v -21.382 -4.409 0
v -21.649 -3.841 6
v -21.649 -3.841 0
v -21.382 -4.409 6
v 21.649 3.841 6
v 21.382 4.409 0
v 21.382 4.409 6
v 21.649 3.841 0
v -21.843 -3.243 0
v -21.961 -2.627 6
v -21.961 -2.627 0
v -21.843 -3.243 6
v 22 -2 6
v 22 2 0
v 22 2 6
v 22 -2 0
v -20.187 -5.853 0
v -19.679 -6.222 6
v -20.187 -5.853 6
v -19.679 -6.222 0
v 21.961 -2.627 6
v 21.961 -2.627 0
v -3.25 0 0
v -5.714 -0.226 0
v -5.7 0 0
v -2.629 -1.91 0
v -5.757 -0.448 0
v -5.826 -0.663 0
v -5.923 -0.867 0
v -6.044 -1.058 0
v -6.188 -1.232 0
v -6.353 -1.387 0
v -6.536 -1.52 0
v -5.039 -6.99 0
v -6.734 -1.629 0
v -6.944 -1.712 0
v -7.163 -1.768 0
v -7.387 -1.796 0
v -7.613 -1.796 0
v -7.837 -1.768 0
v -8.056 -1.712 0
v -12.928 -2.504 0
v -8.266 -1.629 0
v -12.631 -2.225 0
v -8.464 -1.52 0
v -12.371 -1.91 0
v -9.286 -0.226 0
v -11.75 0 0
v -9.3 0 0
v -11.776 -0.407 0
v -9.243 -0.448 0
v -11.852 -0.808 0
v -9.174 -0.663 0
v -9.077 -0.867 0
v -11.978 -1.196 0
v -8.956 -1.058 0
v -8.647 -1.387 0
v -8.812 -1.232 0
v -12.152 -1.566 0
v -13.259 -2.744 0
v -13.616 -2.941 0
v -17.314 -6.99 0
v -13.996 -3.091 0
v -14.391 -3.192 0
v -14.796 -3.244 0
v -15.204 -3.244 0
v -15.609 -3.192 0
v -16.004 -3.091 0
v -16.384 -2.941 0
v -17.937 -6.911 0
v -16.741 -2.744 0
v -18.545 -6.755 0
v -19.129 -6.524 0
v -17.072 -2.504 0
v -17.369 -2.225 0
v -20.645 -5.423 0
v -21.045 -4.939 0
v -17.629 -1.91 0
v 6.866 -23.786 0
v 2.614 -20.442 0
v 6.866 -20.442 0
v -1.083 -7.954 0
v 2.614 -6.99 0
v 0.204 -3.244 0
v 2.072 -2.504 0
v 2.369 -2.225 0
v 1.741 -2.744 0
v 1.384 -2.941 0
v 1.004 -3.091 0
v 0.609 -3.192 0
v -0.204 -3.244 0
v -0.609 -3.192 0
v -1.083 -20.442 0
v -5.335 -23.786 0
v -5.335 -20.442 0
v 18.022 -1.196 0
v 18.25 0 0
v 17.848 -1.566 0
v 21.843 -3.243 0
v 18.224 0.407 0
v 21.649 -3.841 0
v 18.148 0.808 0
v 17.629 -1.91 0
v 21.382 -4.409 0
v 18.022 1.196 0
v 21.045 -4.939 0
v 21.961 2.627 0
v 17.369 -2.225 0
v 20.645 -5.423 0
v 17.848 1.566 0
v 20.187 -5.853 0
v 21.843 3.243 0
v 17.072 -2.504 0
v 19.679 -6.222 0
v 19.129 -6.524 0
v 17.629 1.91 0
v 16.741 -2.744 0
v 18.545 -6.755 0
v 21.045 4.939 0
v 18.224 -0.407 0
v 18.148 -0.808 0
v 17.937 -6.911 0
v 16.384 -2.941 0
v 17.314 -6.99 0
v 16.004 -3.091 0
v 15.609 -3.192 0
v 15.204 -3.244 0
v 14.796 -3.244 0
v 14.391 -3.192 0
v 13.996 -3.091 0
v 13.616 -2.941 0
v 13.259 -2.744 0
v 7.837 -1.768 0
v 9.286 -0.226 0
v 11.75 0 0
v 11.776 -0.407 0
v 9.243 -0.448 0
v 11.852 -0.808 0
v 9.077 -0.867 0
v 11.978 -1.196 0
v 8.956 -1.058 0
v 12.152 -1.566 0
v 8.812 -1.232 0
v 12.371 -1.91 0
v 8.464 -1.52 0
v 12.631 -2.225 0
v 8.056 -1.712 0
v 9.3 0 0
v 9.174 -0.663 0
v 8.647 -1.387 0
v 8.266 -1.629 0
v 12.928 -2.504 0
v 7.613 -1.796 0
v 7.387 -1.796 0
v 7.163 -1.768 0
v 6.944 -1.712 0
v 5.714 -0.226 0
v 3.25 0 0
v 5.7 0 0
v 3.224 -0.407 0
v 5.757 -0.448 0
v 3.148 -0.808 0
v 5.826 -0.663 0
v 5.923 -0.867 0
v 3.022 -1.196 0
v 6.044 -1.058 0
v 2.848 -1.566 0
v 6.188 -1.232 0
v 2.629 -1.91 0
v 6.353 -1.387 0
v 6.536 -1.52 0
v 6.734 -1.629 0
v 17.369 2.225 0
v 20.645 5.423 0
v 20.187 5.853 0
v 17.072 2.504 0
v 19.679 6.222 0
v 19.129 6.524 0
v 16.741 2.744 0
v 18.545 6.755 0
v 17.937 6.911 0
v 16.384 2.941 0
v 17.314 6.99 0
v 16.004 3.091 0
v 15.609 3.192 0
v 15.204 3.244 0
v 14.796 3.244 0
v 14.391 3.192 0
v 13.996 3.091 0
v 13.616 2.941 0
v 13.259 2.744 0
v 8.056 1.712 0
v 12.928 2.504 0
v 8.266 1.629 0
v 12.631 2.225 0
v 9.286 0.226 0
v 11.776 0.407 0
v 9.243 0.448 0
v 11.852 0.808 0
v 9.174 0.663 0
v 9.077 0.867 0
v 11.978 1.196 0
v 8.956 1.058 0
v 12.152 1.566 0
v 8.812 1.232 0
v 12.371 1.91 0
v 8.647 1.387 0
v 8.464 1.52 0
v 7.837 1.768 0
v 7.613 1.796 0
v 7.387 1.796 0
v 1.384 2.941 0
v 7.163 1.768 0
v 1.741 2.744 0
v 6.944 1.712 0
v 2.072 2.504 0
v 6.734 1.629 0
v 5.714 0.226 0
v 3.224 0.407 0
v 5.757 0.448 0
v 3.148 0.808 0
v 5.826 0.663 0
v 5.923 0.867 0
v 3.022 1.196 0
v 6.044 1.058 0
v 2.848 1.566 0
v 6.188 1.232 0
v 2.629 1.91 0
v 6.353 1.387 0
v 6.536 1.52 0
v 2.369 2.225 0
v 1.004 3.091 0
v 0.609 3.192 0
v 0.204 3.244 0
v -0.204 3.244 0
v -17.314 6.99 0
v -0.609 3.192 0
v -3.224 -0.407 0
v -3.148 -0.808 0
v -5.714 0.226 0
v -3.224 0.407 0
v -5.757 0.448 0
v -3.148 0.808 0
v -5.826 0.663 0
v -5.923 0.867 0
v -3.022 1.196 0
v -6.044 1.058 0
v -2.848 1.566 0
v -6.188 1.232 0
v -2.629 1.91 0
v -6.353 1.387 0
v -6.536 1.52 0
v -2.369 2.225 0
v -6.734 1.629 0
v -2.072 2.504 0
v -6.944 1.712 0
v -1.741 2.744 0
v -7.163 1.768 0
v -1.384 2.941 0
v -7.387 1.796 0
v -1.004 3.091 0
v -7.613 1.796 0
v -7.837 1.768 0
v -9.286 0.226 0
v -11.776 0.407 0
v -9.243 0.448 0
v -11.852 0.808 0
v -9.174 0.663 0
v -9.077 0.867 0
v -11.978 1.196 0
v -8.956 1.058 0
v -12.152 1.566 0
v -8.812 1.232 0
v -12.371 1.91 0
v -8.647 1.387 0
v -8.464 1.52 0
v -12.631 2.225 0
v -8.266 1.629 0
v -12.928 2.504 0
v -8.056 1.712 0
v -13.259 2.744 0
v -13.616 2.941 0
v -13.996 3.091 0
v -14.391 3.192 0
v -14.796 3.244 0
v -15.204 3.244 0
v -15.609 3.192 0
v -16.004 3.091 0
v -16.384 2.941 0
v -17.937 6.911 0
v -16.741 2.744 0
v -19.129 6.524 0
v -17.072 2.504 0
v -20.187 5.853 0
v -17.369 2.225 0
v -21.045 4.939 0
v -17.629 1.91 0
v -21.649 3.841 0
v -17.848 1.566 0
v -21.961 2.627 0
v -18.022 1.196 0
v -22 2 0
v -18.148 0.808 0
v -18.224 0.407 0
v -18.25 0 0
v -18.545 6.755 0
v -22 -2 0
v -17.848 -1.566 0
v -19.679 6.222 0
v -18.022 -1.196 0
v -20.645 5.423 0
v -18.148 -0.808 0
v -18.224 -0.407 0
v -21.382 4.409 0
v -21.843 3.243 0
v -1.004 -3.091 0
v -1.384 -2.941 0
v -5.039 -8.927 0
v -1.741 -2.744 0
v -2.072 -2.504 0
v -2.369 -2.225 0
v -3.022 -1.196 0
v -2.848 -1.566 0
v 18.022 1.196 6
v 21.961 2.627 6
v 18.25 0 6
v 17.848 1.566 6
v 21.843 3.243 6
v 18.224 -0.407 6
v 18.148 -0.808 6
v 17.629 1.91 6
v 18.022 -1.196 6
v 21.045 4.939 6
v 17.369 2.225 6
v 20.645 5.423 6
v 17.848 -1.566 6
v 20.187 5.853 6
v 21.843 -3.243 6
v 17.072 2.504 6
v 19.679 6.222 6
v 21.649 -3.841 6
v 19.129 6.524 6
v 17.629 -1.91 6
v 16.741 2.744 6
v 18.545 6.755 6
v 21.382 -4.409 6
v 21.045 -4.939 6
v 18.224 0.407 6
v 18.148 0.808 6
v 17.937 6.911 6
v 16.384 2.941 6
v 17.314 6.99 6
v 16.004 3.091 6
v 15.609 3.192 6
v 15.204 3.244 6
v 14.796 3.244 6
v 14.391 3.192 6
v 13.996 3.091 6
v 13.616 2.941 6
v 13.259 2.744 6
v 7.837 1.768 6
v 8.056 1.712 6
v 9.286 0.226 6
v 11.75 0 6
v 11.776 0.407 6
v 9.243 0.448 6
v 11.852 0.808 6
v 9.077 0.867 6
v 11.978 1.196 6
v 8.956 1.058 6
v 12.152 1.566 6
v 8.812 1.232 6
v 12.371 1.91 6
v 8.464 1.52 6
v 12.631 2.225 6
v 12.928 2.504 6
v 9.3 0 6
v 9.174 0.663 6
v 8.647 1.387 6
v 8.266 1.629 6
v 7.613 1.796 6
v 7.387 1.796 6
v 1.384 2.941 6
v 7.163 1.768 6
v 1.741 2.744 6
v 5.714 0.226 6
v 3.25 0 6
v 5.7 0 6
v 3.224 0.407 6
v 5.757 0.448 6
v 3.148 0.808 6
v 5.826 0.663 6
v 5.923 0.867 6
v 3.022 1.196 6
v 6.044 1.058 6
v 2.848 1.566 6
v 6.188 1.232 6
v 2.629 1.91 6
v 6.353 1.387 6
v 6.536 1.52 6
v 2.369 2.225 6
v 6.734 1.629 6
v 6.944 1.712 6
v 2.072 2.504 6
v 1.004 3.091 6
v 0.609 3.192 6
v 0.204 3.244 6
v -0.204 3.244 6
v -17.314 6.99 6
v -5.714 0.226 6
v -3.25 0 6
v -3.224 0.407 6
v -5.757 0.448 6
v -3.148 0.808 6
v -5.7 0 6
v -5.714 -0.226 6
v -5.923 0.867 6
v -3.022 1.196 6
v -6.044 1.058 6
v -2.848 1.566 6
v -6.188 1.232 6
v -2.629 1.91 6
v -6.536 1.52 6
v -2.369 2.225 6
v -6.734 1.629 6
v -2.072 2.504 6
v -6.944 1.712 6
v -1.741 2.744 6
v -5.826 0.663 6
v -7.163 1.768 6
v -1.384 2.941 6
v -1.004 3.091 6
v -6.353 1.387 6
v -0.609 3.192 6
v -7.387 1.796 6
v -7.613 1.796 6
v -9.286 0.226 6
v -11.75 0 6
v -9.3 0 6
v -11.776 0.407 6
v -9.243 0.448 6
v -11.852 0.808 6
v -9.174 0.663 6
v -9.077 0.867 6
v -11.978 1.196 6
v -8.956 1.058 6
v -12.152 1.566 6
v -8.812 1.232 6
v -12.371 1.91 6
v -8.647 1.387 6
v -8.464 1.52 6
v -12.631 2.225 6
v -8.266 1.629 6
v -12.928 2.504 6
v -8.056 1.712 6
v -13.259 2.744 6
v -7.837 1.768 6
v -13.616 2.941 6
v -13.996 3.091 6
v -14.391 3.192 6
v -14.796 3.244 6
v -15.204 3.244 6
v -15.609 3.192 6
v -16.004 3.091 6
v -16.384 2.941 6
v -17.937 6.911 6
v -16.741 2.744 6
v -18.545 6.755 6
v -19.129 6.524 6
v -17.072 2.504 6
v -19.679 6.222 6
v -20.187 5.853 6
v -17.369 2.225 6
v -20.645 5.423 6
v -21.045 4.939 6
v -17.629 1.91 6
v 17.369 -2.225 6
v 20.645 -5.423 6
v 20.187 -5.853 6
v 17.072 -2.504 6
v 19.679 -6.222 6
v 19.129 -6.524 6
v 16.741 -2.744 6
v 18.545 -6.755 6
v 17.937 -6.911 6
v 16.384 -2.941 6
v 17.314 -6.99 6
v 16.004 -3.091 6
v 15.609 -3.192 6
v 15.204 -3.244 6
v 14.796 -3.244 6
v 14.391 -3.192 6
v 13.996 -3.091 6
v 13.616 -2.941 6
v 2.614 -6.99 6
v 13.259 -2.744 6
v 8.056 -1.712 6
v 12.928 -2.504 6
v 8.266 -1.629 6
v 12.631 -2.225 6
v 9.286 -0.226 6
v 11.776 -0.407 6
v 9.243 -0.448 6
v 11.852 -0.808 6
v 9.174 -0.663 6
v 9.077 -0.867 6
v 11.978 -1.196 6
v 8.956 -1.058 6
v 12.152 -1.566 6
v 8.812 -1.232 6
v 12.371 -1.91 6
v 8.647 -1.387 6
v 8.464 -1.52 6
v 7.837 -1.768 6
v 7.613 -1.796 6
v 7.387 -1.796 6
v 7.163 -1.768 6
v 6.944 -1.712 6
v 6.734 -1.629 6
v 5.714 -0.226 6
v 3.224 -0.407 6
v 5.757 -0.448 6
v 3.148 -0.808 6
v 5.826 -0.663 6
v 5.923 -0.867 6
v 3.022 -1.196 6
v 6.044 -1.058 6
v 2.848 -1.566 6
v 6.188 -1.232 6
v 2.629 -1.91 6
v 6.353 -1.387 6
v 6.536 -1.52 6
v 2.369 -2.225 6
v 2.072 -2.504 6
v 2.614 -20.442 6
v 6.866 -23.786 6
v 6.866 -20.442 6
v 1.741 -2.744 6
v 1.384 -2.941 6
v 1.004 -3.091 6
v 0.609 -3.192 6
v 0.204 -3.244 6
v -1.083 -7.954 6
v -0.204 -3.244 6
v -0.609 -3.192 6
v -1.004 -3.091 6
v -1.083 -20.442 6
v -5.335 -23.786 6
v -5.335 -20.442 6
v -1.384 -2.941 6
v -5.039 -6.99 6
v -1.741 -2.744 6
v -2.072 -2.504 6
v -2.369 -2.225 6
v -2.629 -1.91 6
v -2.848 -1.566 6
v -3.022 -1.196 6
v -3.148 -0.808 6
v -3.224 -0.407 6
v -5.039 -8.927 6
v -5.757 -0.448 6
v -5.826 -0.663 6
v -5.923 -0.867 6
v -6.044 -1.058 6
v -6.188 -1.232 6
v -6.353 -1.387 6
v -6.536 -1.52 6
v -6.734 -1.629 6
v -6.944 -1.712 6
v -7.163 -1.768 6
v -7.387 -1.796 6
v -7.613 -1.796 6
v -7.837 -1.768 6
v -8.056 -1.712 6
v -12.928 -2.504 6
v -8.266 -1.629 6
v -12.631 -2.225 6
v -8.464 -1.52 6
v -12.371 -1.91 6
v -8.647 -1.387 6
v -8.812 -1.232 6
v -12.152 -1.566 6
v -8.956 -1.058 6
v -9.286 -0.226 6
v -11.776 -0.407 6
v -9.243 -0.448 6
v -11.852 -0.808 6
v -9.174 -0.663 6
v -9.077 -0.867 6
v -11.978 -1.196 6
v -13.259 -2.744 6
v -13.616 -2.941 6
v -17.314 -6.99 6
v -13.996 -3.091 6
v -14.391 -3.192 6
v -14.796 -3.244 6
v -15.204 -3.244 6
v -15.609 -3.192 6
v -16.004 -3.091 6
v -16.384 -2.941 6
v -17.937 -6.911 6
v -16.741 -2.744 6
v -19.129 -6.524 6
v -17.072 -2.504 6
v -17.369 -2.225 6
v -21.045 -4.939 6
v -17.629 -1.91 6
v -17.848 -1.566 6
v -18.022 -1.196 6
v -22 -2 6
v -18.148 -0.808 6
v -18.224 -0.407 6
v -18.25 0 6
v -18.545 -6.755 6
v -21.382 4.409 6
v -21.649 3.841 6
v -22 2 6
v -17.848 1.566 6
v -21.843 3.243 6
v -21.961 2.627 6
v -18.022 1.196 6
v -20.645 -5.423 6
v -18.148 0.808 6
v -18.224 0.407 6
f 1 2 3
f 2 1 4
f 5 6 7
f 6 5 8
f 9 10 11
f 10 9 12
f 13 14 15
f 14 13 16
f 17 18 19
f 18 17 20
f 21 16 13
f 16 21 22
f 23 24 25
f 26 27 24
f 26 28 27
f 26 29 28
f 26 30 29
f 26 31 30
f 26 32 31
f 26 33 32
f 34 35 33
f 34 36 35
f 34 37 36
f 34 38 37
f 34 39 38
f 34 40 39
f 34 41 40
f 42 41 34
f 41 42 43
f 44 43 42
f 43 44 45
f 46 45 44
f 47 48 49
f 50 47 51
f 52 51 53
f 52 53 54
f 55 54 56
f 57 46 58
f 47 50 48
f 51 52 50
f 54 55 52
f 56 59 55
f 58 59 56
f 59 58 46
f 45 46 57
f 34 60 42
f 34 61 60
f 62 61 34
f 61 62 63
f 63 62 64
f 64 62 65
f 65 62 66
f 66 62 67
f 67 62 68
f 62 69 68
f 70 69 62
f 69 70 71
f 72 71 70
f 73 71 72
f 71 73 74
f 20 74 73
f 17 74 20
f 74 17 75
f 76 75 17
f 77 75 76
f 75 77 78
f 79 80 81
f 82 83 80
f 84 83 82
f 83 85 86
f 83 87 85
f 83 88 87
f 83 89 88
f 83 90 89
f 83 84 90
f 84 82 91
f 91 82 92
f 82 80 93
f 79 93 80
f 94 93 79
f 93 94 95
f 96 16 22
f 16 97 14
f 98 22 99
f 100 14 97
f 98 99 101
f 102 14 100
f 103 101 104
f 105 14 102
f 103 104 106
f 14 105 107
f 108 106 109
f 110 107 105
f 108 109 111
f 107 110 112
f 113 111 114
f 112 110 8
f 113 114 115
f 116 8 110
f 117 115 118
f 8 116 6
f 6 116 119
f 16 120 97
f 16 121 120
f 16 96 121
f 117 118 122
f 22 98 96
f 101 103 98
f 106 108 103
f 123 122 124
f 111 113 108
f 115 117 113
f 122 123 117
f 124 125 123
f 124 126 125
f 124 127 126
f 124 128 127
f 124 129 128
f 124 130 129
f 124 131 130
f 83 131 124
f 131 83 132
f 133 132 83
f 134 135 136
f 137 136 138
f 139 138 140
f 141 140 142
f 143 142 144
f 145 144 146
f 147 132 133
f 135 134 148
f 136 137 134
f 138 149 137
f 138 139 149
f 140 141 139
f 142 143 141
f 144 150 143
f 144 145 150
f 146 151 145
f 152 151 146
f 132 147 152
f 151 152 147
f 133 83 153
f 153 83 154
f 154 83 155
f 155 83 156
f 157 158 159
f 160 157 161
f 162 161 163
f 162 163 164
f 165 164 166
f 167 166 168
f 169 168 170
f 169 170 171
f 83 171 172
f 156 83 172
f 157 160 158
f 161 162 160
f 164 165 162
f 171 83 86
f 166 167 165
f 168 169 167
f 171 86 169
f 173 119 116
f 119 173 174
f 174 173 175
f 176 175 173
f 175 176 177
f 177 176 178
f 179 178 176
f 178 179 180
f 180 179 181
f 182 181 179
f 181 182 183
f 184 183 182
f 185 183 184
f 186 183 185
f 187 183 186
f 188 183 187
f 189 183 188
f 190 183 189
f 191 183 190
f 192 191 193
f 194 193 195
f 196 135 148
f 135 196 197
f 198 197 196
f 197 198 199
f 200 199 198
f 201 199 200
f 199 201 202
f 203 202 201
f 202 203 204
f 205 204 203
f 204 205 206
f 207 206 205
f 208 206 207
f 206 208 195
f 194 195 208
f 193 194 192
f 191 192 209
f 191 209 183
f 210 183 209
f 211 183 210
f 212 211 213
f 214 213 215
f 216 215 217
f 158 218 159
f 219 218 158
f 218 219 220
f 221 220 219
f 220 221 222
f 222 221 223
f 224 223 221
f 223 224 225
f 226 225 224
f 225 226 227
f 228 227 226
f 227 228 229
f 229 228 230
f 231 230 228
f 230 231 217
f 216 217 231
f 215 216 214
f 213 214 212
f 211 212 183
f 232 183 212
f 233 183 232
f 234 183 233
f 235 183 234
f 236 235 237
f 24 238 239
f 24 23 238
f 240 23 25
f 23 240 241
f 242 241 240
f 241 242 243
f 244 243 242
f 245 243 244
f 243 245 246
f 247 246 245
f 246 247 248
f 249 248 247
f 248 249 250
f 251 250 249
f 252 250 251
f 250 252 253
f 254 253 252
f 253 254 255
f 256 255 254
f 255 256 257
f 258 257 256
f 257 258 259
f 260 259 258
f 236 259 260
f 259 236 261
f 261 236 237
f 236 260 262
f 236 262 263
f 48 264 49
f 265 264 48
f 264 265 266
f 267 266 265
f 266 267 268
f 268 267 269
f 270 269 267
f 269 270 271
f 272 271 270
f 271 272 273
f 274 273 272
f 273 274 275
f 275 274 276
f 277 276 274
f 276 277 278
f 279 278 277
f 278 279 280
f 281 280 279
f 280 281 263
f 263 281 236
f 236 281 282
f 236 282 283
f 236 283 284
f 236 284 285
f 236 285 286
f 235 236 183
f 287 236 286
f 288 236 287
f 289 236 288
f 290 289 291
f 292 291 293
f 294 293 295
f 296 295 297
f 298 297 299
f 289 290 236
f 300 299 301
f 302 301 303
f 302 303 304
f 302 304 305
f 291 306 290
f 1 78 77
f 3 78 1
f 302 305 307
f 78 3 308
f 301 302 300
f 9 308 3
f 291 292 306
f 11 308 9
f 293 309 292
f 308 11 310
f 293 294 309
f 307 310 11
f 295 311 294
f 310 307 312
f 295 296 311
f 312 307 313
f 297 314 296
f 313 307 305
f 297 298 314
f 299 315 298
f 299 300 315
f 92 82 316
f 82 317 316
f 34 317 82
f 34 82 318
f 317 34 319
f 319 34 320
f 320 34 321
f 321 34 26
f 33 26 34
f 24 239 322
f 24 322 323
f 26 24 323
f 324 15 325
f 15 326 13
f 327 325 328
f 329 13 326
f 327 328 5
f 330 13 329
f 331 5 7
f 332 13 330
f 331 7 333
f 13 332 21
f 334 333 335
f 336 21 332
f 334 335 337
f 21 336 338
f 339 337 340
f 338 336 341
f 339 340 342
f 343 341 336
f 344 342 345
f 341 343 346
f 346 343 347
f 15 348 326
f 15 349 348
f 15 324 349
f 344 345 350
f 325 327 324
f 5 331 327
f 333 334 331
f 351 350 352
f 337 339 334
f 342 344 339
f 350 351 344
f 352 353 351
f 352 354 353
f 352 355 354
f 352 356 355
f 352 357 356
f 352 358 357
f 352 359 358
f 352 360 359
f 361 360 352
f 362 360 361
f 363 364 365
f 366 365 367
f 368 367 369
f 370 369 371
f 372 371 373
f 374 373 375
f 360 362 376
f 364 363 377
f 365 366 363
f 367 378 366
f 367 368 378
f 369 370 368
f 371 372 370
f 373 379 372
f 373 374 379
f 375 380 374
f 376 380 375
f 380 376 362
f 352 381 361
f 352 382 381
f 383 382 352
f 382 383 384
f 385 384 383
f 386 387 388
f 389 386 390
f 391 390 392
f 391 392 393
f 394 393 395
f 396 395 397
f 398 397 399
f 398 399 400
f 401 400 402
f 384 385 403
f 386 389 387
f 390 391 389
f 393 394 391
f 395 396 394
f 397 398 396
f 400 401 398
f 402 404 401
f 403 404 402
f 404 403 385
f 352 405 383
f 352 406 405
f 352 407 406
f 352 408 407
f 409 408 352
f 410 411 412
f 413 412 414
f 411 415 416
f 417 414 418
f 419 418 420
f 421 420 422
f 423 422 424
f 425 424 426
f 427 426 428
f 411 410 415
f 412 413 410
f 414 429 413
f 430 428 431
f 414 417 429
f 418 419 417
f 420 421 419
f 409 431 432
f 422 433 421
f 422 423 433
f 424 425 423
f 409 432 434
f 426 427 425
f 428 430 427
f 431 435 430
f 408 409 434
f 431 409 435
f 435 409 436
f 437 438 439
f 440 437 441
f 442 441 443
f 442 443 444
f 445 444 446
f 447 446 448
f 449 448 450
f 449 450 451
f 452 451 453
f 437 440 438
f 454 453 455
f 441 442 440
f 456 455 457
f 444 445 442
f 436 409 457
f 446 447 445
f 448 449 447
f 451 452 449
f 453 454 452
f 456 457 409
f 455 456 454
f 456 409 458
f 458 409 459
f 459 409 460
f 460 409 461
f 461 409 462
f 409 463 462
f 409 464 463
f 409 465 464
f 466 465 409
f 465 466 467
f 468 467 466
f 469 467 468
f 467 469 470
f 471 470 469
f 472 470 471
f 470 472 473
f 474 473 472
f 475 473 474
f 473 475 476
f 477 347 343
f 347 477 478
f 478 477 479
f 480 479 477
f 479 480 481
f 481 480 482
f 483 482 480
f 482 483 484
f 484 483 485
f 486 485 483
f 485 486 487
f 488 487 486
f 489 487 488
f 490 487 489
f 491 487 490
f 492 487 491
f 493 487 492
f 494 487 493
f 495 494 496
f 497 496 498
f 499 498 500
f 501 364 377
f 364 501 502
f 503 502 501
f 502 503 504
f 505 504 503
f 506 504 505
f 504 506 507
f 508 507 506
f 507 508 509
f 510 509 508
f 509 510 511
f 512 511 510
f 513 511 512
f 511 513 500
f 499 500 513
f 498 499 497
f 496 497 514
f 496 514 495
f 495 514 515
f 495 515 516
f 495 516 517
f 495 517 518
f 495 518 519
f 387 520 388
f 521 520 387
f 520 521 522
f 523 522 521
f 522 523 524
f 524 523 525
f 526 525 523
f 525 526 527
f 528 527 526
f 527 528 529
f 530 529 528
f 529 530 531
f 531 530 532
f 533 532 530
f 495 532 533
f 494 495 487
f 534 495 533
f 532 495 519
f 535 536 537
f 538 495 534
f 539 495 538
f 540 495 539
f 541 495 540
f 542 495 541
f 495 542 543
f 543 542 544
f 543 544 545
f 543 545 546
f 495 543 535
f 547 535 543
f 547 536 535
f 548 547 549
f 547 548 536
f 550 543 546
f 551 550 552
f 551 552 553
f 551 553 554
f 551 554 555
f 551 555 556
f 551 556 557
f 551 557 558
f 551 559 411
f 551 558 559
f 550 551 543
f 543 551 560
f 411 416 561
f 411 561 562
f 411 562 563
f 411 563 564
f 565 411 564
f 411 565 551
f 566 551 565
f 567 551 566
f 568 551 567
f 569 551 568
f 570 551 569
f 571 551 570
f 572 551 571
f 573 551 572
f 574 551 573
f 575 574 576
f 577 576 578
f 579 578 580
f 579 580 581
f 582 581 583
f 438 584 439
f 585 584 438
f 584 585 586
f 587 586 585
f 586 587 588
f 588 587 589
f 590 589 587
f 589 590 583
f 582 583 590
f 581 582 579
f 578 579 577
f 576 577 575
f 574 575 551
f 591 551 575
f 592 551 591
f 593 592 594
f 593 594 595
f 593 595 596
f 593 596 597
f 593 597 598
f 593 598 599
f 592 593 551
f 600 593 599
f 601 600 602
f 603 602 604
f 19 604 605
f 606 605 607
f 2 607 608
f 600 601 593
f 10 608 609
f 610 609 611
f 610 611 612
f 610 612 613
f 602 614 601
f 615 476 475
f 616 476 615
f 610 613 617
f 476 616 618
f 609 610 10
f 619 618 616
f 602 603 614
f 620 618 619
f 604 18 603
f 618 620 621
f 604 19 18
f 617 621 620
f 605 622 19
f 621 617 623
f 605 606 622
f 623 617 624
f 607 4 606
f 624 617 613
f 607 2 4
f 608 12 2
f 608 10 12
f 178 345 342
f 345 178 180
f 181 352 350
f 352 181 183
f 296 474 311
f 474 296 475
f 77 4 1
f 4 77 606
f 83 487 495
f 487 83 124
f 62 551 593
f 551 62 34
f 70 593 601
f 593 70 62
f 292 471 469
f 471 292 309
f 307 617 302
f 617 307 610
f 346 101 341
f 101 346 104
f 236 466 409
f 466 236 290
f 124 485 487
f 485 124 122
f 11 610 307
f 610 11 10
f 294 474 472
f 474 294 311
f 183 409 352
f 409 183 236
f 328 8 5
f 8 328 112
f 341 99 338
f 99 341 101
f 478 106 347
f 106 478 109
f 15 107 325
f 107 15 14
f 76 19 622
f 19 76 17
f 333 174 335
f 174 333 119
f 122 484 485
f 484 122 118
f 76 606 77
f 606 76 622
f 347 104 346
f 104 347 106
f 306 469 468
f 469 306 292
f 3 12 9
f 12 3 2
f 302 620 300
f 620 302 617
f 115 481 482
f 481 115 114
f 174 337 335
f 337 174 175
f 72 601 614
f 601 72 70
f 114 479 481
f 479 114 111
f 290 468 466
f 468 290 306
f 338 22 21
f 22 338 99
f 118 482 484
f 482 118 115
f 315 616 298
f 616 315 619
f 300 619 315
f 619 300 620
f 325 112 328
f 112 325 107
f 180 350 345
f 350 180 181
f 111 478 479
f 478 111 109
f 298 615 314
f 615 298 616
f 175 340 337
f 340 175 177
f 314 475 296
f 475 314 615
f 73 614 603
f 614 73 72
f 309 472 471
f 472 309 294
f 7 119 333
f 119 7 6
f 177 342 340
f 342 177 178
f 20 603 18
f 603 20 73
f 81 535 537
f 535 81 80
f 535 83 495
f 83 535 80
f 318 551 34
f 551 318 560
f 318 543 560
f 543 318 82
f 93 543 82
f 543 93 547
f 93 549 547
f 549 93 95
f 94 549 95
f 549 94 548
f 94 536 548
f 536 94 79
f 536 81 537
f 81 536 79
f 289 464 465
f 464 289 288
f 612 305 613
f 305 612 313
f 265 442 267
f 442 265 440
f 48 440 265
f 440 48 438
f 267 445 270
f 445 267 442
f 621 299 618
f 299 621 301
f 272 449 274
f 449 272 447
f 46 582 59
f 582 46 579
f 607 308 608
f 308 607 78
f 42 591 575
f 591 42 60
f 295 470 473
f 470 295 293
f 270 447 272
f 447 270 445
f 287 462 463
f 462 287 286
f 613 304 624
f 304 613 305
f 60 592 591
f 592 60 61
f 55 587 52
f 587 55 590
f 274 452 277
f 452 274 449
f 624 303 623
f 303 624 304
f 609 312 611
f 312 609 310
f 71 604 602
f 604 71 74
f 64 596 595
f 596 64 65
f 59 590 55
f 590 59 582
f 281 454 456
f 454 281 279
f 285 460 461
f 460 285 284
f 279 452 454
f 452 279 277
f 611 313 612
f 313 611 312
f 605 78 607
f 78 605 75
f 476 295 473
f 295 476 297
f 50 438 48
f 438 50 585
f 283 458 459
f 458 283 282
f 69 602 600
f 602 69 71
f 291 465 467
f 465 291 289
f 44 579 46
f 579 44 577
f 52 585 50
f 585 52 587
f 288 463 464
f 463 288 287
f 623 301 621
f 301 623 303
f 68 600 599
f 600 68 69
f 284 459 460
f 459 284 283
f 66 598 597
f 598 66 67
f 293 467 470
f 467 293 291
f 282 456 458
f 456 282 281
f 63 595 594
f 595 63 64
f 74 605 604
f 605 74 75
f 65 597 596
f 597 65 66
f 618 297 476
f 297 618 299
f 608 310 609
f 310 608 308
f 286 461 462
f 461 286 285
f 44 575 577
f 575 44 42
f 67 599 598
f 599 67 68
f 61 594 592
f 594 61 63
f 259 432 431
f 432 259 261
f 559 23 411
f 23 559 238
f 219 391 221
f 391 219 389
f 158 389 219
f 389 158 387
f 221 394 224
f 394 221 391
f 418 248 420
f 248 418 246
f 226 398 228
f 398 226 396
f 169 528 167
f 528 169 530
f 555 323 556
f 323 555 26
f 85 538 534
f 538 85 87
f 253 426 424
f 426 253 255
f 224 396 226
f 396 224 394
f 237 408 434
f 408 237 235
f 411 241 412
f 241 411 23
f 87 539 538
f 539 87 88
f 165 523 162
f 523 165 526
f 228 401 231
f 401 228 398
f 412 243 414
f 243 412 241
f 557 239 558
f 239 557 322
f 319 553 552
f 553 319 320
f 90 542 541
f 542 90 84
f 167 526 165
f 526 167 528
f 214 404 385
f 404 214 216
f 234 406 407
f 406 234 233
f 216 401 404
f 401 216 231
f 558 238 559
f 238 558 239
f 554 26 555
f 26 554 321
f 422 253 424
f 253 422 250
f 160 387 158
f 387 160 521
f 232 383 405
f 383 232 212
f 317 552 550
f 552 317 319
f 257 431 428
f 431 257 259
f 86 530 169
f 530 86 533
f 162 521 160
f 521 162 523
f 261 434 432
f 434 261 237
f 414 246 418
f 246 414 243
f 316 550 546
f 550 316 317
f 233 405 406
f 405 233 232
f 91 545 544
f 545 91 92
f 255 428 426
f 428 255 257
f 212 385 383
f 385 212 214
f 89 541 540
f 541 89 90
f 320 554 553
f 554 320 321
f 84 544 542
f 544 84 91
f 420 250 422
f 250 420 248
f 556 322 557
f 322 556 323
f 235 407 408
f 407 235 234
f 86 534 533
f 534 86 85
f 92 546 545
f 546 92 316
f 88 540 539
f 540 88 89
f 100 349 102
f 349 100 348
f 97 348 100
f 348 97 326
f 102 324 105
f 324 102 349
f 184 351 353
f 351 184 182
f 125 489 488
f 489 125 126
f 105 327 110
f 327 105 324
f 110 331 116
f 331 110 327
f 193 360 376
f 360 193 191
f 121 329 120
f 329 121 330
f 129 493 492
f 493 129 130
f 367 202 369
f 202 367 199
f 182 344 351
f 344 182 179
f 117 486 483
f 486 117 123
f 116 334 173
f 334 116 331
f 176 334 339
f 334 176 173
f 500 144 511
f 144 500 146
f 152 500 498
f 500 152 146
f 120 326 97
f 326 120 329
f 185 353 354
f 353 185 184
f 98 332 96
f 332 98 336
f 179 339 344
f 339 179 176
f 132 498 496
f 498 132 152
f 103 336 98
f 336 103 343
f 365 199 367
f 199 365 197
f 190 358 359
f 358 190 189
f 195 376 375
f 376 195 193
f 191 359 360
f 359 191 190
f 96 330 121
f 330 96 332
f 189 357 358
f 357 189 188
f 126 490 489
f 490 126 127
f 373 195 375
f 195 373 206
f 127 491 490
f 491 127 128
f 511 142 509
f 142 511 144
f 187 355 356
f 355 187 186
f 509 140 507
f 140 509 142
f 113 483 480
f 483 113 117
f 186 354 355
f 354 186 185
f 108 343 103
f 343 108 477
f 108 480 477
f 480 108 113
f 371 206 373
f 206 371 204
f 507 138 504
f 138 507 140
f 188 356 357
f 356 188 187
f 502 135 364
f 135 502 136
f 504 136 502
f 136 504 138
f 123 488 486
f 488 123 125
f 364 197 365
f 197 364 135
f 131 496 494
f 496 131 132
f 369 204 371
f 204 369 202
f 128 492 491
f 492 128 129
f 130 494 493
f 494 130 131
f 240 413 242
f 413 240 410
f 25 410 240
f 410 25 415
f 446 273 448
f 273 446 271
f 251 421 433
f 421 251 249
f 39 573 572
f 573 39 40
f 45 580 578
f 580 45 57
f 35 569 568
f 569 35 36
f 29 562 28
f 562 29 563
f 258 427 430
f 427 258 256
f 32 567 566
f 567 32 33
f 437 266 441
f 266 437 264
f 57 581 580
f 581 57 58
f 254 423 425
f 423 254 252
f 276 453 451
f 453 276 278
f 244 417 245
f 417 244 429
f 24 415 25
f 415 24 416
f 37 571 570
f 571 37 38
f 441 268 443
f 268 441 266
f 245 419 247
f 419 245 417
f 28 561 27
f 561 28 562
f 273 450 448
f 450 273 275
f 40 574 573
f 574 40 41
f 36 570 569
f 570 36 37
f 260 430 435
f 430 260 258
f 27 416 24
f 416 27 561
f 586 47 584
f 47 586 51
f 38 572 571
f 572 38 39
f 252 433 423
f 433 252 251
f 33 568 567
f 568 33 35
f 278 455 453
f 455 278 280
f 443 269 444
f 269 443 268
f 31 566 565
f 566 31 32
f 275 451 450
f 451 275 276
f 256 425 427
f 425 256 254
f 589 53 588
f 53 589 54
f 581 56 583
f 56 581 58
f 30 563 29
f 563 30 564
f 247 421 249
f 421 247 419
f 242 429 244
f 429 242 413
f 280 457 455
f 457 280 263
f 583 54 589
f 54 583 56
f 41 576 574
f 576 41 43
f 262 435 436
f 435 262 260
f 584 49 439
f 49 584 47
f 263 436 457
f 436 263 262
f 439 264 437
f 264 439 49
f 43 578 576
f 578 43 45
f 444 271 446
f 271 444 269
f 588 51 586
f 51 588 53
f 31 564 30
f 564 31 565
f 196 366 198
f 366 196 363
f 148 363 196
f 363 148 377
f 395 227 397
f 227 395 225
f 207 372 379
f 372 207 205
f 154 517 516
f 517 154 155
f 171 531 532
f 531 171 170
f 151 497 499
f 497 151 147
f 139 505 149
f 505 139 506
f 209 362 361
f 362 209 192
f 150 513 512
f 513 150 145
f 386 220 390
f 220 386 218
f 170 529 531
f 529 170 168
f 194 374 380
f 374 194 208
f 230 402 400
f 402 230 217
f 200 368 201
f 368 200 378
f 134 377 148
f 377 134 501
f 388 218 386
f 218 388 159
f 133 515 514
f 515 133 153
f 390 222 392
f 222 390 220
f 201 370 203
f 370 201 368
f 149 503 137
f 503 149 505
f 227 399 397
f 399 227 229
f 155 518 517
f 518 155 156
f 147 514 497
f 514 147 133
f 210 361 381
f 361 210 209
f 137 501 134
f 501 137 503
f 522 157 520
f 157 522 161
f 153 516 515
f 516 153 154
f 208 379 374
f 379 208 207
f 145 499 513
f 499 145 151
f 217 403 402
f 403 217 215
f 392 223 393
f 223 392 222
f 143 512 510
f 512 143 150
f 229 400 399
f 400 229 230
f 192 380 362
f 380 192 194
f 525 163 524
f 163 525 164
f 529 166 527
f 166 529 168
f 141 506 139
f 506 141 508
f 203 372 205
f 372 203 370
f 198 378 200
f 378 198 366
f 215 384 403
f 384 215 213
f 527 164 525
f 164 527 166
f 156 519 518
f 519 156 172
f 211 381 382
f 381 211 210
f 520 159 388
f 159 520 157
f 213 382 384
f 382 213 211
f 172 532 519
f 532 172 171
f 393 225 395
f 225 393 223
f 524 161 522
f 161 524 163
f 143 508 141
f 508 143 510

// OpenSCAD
$fn = 50;


difference() {
	union() {
		hull() {
			translate(v = [-17.0000000000, 2.0000000000, 0]) {
				cylinder(h = 6, r = 5);
			}
			translate(v = [17.0000000000, 2.0000000000, 0]) {
				cylinder(h = 6, r = 5);
			}
			translate(v = [-17.0000000000, -2.0000000000, 0]) {
				cylinder(h = 6, r = 5);
			}
			translate(v = [17.0000000000, -2.0000000000, 0]) {
				cylinder(h = 6, r = 5);
			}
		}
		translate(v = [0, -5, 0]) {
			linear_extrude(height = 6) {
				text(font = "DejaVu Sans Mono:style=Bold", halign = "center", size = 19.0000000000, text = "1", valign = "top");
			}
		}
	}
	union() {
		translate(v = [-15.0000000000, 0.0000000000, 0]) {
			translate(v = [0, 0, -100]) {
				cylinder(h = 200, r = 3.2500000000);
			}
		}
		translate(v = [0, 0, -100]) {
			cylinder(h = 200, r = 3.2500000000);
		}
		translate(v = [15.0000000000, 0.0000000000, 0]) {
			translate(v = [0, 0, -100]) {
				cylinder(h = 200, r = 3.2500000000);
			}
		}
		translate(v = [-15.0000000000, 0.0000000000, 0]) {
			translate(v = [0, 0, -100]) {
				cylinder(h = 200, r = 1.8000000000);
			}
		}
		translate(v = [-7.5000000000, 0.0000000000, 0]) {
			translate(v = [0, 0, -100]) {
				cylinder(h = 200, r = 1.8000000000);
			}
		}
		translate(v = [0, 0, -100]) {
			cylinder(h = 200, r = 1.8000000000);
		}
		translate(v = [7.5000000000, 0.0000000000, 0]) {
			translate(v = [0, 0, -100]) {
				cylinder(h = 200, r = 1.8000000000);
			}
		}
		translate(v = [15.0000000000, 0.0000000000, 0]) {
			translate(v = [0, 0, -100]) {
				cylinder(h = 200, r = 1.8000000000);
			}
		}
	}
}
